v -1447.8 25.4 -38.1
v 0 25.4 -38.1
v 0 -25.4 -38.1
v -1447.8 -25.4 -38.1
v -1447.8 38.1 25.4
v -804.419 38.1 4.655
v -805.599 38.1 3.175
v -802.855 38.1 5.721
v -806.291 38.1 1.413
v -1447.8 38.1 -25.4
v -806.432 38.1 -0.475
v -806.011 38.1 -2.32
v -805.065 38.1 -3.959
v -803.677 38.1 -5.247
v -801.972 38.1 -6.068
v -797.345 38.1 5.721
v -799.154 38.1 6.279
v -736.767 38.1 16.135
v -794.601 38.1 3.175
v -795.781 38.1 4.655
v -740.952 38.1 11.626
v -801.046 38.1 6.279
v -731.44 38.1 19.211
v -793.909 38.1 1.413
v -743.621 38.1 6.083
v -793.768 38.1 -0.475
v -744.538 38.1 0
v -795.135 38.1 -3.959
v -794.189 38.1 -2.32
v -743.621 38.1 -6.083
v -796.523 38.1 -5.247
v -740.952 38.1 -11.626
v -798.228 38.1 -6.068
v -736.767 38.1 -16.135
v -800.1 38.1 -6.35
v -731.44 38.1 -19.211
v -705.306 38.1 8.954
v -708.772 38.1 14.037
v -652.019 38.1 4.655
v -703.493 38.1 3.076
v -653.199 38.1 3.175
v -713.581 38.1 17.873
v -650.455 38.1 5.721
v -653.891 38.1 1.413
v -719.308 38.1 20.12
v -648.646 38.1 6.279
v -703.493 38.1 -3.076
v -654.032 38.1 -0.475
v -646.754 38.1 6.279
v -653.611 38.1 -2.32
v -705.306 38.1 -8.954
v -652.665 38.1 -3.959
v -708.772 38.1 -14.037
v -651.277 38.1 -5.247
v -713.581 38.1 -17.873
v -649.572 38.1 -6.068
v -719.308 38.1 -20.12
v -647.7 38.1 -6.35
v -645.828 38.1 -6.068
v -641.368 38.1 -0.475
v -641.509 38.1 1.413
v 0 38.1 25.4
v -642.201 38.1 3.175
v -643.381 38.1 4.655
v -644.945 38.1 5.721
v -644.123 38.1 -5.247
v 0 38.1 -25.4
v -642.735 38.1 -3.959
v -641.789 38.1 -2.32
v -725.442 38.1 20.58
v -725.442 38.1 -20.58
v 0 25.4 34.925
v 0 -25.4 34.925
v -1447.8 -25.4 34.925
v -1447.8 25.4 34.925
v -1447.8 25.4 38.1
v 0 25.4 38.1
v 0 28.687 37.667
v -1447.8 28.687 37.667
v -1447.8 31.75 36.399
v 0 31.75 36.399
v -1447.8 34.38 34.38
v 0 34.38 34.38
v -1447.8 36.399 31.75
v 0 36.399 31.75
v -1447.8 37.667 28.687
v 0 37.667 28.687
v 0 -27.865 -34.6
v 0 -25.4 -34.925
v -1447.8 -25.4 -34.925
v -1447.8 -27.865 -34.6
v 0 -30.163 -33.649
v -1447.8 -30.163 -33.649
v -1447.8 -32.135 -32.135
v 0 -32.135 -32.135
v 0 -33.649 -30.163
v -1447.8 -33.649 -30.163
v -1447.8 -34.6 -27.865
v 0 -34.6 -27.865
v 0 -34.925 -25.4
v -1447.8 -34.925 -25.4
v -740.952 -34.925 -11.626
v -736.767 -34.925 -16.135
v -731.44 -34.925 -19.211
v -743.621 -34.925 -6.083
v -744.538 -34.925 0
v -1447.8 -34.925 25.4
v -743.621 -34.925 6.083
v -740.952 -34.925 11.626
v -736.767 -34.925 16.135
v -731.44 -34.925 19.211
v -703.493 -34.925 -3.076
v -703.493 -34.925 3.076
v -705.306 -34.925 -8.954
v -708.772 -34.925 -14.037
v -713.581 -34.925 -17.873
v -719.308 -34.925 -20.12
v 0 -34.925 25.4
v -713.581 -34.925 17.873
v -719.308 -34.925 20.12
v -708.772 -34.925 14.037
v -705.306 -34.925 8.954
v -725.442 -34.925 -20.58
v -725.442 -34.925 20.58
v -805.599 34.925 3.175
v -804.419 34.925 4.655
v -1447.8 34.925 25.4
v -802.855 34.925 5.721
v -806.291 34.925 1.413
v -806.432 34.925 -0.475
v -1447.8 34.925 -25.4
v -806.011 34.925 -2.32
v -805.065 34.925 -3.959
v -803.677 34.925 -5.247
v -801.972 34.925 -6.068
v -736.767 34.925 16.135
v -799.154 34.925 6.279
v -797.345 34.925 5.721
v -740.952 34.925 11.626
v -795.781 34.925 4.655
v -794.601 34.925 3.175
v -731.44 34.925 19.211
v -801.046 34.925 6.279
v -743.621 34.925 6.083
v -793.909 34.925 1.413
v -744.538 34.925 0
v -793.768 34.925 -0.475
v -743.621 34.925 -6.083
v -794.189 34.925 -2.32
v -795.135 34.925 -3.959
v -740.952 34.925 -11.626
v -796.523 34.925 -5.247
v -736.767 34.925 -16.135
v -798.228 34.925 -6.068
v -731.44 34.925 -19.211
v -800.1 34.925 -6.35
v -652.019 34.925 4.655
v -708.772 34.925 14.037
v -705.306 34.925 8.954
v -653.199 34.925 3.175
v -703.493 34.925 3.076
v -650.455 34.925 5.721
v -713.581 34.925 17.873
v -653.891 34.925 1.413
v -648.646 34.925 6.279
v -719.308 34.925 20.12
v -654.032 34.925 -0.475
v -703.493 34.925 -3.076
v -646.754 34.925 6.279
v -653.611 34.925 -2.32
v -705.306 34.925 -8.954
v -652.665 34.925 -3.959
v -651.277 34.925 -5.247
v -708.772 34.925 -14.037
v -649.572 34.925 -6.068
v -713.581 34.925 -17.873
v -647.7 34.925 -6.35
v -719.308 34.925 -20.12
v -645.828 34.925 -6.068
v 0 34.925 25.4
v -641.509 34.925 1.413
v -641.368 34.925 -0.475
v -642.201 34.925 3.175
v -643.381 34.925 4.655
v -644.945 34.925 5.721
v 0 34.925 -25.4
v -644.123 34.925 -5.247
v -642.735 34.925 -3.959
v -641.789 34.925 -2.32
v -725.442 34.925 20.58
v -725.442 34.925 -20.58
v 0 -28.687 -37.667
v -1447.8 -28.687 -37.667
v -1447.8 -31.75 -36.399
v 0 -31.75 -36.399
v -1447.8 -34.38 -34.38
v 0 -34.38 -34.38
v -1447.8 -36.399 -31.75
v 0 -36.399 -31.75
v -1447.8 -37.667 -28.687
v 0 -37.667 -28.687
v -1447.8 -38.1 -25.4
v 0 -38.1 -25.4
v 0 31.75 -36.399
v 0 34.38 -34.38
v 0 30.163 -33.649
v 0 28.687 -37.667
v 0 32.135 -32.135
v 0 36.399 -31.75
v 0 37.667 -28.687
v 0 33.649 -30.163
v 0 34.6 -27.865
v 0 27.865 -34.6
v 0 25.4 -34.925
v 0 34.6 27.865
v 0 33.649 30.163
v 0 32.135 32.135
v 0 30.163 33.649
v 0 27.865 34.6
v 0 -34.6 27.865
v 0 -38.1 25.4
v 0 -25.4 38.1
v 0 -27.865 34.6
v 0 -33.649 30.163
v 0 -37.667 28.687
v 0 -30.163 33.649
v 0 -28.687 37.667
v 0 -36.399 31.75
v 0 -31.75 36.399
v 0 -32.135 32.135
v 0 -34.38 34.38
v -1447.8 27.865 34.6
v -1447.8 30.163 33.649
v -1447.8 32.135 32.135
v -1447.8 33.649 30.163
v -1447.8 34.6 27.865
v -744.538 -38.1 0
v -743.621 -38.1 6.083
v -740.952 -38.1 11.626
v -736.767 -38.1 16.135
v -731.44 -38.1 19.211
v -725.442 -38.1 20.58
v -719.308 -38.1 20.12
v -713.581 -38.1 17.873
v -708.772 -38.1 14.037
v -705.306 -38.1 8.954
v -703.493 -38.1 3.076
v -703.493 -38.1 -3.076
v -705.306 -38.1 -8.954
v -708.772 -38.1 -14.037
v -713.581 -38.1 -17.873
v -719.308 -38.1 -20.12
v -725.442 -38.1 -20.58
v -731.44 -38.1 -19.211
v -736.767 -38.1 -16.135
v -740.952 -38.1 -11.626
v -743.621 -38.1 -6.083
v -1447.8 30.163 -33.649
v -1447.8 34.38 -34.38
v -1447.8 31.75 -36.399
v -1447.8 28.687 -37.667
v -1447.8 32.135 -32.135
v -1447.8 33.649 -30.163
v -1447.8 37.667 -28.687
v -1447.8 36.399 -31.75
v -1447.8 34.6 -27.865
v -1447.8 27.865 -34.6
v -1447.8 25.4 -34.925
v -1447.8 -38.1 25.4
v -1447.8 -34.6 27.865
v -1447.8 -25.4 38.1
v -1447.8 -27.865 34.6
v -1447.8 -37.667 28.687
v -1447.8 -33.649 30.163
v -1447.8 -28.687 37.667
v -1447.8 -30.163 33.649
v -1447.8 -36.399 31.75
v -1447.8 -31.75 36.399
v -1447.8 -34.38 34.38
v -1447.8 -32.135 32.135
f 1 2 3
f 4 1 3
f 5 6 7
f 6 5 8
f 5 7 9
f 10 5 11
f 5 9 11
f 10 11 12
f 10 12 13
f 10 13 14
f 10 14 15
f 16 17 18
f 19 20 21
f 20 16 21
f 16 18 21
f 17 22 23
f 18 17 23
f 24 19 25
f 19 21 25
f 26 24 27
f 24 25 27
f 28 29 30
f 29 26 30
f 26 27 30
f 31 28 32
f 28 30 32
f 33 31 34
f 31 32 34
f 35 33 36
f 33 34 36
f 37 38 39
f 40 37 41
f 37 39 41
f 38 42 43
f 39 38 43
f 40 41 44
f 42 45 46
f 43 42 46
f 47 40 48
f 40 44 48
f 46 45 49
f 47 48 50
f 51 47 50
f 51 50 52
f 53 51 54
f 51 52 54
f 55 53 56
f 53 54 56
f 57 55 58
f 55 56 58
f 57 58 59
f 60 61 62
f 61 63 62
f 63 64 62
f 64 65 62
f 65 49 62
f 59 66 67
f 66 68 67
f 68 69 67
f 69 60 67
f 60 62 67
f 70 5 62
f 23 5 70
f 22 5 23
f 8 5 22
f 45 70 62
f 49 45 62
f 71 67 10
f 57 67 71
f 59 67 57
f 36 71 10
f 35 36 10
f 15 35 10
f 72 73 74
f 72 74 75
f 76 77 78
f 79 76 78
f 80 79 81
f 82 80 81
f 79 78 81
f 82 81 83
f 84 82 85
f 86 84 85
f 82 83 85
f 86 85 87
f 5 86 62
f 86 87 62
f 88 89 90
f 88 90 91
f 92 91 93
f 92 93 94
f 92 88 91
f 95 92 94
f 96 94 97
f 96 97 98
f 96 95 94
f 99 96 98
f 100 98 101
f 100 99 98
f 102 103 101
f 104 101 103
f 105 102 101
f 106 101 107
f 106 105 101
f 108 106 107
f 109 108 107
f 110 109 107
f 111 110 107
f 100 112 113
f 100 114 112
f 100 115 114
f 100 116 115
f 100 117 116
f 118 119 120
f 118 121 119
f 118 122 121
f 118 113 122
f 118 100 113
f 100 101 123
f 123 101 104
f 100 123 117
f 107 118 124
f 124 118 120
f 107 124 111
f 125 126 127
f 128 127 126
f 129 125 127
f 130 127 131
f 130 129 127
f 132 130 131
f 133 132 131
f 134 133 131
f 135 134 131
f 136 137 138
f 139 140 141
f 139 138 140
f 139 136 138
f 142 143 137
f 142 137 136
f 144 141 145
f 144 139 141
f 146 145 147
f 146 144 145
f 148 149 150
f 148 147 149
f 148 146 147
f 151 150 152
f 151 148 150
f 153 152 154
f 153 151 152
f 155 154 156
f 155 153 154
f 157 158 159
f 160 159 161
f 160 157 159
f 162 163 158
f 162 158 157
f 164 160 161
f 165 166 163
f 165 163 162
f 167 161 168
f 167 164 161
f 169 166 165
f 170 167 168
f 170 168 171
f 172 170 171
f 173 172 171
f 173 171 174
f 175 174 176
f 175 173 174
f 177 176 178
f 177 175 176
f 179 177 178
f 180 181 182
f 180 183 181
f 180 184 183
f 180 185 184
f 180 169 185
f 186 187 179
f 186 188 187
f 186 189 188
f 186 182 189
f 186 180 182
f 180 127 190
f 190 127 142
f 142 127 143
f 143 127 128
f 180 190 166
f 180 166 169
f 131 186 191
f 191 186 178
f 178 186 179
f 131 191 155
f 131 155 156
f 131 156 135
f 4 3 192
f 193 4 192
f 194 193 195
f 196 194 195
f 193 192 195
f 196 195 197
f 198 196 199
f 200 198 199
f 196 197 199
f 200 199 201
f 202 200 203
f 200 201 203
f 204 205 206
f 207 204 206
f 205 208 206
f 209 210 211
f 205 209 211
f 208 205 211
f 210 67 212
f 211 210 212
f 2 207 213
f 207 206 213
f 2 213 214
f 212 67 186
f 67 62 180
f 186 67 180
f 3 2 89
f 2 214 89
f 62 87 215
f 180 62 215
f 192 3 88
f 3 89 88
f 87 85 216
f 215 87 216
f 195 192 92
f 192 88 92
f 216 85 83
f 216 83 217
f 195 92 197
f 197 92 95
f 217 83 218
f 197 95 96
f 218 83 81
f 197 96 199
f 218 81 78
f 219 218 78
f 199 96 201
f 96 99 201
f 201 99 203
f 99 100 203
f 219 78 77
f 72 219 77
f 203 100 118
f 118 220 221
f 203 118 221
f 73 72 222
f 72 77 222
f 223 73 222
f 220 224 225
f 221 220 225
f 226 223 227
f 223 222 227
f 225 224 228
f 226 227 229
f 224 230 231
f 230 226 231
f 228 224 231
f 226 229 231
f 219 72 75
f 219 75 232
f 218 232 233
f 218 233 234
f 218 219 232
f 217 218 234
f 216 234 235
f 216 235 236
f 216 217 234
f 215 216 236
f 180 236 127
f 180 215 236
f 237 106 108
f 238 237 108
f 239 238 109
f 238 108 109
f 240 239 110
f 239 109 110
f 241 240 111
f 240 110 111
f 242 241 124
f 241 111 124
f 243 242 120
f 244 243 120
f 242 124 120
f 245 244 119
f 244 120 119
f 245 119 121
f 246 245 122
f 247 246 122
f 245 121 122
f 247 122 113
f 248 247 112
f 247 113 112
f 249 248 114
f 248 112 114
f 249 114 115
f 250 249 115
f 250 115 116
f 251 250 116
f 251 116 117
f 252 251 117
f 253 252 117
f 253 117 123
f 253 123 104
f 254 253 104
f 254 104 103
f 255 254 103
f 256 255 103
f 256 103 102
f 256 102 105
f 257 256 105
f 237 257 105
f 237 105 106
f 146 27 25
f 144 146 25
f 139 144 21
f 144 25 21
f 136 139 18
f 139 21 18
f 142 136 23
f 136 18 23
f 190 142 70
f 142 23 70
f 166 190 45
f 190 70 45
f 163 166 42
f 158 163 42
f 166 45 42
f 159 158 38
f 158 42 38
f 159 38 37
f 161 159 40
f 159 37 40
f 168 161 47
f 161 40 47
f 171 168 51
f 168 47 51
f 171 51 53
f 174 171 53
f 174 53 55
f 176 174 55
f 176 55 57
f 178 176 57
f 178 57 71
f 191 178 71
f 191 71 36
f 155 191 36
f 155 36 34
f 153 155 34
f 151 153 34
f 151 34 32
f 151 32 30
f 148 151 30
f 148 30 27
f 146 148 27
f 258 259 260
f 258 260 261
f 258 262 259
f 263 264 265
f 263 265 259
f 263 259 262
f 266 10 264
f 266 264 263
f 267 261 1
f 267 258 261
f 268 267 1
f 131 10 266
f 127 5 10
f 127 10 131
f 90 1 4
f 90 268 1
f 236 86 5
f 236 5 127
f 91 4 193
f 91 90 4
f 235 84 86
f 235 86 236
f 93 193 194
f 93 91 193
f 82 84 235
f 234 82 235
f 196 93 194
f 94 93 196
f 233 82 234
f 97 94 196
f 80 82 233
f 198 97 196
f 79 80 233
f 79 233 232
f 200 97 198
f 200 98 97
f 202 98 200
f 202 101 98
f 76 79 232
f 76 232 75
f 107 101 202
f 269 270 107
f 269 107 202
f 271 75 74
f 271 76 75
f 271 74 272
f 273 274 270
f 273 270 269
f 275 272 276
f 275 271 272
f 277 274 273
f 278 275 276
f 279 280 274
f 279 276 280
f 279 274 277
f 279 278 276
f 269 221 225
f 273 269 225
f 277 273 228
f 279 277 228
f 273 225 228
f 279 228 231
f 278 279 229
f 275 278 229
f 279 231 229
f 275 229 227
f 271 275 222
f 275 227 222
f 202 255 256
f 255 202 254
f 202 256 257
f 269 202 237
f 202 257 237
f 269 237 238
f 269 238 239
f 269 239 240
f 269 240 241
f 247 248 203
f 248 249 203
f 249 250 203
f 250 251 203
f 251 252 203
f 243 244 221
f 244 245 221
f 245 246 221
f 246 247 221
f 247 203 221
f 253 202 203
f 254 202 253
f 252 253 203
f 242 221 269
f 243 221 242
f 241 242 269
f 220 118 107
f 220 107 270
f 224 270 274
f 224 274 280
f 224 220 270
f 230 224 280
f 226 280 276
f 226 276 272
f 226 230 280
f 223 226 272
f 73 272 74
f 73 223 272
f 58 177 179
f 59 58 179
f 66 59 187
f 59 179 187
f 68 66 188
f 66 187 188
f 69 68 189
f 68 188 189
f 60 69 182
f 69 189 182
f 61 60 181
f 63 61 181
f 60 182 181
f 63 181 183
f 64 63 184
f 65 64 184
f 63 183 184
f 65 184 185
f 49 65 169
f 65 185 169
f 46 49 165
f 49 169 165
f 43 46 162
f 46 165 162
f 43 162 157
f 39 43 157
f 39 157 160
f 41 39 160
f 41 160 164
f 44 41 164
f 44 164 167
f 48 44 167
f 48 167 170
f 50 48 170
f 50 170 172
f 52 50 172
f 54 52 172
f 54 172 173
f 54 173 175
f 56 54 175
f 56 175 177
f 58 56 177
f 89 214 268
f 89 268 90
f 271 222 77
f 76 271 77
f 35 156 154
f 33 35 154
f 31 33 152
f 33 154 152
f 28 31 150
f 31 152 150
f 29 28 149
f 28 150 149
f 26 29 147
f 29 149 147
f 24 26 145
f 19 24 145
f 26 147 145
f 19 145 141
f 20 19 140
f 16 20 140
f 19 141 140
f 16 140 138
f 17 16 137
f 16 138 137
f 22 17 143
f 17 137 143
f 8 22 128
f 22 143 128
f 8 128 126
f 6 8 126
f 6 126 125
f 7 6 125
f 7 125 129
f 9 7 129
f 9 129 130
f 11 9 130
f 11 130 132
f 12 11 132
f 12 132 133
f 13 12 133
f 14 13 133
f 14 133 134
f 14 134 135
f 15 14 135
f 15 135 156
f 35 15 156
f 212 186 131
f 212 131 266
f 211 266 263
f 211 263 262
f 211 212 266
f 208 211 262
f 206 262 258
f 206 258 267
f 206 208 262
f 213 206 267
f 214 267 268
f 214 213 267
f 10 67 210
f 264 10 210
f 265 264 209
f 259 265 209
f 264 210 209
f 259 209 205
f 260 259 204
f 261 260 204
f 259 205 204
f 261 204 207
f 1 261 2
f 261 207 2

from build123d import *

# Parameters (mm, degrees)
STRUCTURAL_MEMBER1_DEPTH       = 1447.8
SKETCH12_R                     = 20.6375
CUT_EXTRUDE1_DEPTH             = 1451.304412873
F_1_2_0_5_DIAMETER_HOLE1_D     = 12.7
F_1_2_0_5_DIAMETER_HOLE1_DEPTH = 25.4
F_1_2_0_5_DIAMETER_HOLE1_TIP   = 3.815464931


with BuildPart() as part:
    # Sketch11 → Structural Member1 (new body)
    with BuildSketch(Plane(origin=(0, 0, 0), x_dir=(0, -1, 0), z_dir=(-1, 0, 0))):
        with BuildLine():
            Line((-25.4, -38.1), (25.4, -38.1))
            ThreePointArc((25.4, -38.1), (34.380256121, -34.380256121), (38.1, -25.4))
            Line((38.1, -25.4), (38.1, 25.4))
            ThreePointArc((38.1, 25.4), (34.380256121, 34.380256121), (25.4, 38.1))
            Line((25.4, 38.1), (-25.4, 38.1))
            ThreePointArc((-25.4, 38.1), (-34.380256121, 34.380256121), (-38.1, 25.4))
            Line((-38.1, 25.4), (-38.1, -25.4))
            ThreePointArc((-38.1, -25.4), (-34.380256121, -34.380256121), (-25.4, -38.1))
        make_face()
        with BuildLine():
            Line((-25.4, -34.925), (25.4, -34.925))
            ThreePointArc((25.4, -34.925), (32.135192091, -32.135192091), (34.925, -25.4))
            Line((34.925, -25.4), (34.925, 25.4))
            ThreePointArc((34.925, 25.4), (32.135192091, 32.135192091), (25.4, 34.925))
            Line((25.4, 34.925), (-25.4, 34.925))
            ThreePointArc((-25.4, 34.925), (-32.135192091, 32.135192091), (-34.925, 25.4))
            Line((-34.925, 25.4), (-34.925, -25.4))
            ThreePointArc((-34.925, -25.4), (-32.135192091, -32.135192091), (-25.4, -34.925))
        make_face(mode=Mode.SUBTRACT)
    extrude(amount=STRUCTURAL_MEMBER1_DEPTH)

    # Sketch12 → Cut-Extrude1 (cut, through all)
    with BuildSketch(Plane(origin=(0, 38.1, 0), x_dir=(1, 0, 0), z_dir=(0, 1, 0))):
        with Locations(Location((-723.9, 0, 0), (0, 0, 180))):
            Circle(SKETCH12_R)
    extrude(amount=-CUT_EXTRUDE1_DEPTH, mode=Mode.SUBTRACT)

    # 1/2 (0.5) Diameter Hole1
    with Locations(Plane(origin=(-800.1, 38.1, 0), x_dir=(0, 0, 1), z_dir=(0, 1, 0))):
        with Locations((0, 0), (0, 152.4)):
            Hole(F_1_2_0_5_DIAMETER_HOLE1_D / 2, depth=F_1_2_0_5_DIAMETER_HOLE1_DEPTH)
            with Locations((0, 0, -(F_1_2_0_5_DIAMETER_HOLE1_DEPTH + F_1_2_0_5_DIAMETER_HOLE1_TIP / 2))):  # 118° drill point
                Cone(0, F_1_2_0_5_DIAMETER_HOLE1_D / 2, F_1_2_0_5_DIAMETER_HOLE1_TIP, mode=Mode.SUBTRACT)


solid = part.part
